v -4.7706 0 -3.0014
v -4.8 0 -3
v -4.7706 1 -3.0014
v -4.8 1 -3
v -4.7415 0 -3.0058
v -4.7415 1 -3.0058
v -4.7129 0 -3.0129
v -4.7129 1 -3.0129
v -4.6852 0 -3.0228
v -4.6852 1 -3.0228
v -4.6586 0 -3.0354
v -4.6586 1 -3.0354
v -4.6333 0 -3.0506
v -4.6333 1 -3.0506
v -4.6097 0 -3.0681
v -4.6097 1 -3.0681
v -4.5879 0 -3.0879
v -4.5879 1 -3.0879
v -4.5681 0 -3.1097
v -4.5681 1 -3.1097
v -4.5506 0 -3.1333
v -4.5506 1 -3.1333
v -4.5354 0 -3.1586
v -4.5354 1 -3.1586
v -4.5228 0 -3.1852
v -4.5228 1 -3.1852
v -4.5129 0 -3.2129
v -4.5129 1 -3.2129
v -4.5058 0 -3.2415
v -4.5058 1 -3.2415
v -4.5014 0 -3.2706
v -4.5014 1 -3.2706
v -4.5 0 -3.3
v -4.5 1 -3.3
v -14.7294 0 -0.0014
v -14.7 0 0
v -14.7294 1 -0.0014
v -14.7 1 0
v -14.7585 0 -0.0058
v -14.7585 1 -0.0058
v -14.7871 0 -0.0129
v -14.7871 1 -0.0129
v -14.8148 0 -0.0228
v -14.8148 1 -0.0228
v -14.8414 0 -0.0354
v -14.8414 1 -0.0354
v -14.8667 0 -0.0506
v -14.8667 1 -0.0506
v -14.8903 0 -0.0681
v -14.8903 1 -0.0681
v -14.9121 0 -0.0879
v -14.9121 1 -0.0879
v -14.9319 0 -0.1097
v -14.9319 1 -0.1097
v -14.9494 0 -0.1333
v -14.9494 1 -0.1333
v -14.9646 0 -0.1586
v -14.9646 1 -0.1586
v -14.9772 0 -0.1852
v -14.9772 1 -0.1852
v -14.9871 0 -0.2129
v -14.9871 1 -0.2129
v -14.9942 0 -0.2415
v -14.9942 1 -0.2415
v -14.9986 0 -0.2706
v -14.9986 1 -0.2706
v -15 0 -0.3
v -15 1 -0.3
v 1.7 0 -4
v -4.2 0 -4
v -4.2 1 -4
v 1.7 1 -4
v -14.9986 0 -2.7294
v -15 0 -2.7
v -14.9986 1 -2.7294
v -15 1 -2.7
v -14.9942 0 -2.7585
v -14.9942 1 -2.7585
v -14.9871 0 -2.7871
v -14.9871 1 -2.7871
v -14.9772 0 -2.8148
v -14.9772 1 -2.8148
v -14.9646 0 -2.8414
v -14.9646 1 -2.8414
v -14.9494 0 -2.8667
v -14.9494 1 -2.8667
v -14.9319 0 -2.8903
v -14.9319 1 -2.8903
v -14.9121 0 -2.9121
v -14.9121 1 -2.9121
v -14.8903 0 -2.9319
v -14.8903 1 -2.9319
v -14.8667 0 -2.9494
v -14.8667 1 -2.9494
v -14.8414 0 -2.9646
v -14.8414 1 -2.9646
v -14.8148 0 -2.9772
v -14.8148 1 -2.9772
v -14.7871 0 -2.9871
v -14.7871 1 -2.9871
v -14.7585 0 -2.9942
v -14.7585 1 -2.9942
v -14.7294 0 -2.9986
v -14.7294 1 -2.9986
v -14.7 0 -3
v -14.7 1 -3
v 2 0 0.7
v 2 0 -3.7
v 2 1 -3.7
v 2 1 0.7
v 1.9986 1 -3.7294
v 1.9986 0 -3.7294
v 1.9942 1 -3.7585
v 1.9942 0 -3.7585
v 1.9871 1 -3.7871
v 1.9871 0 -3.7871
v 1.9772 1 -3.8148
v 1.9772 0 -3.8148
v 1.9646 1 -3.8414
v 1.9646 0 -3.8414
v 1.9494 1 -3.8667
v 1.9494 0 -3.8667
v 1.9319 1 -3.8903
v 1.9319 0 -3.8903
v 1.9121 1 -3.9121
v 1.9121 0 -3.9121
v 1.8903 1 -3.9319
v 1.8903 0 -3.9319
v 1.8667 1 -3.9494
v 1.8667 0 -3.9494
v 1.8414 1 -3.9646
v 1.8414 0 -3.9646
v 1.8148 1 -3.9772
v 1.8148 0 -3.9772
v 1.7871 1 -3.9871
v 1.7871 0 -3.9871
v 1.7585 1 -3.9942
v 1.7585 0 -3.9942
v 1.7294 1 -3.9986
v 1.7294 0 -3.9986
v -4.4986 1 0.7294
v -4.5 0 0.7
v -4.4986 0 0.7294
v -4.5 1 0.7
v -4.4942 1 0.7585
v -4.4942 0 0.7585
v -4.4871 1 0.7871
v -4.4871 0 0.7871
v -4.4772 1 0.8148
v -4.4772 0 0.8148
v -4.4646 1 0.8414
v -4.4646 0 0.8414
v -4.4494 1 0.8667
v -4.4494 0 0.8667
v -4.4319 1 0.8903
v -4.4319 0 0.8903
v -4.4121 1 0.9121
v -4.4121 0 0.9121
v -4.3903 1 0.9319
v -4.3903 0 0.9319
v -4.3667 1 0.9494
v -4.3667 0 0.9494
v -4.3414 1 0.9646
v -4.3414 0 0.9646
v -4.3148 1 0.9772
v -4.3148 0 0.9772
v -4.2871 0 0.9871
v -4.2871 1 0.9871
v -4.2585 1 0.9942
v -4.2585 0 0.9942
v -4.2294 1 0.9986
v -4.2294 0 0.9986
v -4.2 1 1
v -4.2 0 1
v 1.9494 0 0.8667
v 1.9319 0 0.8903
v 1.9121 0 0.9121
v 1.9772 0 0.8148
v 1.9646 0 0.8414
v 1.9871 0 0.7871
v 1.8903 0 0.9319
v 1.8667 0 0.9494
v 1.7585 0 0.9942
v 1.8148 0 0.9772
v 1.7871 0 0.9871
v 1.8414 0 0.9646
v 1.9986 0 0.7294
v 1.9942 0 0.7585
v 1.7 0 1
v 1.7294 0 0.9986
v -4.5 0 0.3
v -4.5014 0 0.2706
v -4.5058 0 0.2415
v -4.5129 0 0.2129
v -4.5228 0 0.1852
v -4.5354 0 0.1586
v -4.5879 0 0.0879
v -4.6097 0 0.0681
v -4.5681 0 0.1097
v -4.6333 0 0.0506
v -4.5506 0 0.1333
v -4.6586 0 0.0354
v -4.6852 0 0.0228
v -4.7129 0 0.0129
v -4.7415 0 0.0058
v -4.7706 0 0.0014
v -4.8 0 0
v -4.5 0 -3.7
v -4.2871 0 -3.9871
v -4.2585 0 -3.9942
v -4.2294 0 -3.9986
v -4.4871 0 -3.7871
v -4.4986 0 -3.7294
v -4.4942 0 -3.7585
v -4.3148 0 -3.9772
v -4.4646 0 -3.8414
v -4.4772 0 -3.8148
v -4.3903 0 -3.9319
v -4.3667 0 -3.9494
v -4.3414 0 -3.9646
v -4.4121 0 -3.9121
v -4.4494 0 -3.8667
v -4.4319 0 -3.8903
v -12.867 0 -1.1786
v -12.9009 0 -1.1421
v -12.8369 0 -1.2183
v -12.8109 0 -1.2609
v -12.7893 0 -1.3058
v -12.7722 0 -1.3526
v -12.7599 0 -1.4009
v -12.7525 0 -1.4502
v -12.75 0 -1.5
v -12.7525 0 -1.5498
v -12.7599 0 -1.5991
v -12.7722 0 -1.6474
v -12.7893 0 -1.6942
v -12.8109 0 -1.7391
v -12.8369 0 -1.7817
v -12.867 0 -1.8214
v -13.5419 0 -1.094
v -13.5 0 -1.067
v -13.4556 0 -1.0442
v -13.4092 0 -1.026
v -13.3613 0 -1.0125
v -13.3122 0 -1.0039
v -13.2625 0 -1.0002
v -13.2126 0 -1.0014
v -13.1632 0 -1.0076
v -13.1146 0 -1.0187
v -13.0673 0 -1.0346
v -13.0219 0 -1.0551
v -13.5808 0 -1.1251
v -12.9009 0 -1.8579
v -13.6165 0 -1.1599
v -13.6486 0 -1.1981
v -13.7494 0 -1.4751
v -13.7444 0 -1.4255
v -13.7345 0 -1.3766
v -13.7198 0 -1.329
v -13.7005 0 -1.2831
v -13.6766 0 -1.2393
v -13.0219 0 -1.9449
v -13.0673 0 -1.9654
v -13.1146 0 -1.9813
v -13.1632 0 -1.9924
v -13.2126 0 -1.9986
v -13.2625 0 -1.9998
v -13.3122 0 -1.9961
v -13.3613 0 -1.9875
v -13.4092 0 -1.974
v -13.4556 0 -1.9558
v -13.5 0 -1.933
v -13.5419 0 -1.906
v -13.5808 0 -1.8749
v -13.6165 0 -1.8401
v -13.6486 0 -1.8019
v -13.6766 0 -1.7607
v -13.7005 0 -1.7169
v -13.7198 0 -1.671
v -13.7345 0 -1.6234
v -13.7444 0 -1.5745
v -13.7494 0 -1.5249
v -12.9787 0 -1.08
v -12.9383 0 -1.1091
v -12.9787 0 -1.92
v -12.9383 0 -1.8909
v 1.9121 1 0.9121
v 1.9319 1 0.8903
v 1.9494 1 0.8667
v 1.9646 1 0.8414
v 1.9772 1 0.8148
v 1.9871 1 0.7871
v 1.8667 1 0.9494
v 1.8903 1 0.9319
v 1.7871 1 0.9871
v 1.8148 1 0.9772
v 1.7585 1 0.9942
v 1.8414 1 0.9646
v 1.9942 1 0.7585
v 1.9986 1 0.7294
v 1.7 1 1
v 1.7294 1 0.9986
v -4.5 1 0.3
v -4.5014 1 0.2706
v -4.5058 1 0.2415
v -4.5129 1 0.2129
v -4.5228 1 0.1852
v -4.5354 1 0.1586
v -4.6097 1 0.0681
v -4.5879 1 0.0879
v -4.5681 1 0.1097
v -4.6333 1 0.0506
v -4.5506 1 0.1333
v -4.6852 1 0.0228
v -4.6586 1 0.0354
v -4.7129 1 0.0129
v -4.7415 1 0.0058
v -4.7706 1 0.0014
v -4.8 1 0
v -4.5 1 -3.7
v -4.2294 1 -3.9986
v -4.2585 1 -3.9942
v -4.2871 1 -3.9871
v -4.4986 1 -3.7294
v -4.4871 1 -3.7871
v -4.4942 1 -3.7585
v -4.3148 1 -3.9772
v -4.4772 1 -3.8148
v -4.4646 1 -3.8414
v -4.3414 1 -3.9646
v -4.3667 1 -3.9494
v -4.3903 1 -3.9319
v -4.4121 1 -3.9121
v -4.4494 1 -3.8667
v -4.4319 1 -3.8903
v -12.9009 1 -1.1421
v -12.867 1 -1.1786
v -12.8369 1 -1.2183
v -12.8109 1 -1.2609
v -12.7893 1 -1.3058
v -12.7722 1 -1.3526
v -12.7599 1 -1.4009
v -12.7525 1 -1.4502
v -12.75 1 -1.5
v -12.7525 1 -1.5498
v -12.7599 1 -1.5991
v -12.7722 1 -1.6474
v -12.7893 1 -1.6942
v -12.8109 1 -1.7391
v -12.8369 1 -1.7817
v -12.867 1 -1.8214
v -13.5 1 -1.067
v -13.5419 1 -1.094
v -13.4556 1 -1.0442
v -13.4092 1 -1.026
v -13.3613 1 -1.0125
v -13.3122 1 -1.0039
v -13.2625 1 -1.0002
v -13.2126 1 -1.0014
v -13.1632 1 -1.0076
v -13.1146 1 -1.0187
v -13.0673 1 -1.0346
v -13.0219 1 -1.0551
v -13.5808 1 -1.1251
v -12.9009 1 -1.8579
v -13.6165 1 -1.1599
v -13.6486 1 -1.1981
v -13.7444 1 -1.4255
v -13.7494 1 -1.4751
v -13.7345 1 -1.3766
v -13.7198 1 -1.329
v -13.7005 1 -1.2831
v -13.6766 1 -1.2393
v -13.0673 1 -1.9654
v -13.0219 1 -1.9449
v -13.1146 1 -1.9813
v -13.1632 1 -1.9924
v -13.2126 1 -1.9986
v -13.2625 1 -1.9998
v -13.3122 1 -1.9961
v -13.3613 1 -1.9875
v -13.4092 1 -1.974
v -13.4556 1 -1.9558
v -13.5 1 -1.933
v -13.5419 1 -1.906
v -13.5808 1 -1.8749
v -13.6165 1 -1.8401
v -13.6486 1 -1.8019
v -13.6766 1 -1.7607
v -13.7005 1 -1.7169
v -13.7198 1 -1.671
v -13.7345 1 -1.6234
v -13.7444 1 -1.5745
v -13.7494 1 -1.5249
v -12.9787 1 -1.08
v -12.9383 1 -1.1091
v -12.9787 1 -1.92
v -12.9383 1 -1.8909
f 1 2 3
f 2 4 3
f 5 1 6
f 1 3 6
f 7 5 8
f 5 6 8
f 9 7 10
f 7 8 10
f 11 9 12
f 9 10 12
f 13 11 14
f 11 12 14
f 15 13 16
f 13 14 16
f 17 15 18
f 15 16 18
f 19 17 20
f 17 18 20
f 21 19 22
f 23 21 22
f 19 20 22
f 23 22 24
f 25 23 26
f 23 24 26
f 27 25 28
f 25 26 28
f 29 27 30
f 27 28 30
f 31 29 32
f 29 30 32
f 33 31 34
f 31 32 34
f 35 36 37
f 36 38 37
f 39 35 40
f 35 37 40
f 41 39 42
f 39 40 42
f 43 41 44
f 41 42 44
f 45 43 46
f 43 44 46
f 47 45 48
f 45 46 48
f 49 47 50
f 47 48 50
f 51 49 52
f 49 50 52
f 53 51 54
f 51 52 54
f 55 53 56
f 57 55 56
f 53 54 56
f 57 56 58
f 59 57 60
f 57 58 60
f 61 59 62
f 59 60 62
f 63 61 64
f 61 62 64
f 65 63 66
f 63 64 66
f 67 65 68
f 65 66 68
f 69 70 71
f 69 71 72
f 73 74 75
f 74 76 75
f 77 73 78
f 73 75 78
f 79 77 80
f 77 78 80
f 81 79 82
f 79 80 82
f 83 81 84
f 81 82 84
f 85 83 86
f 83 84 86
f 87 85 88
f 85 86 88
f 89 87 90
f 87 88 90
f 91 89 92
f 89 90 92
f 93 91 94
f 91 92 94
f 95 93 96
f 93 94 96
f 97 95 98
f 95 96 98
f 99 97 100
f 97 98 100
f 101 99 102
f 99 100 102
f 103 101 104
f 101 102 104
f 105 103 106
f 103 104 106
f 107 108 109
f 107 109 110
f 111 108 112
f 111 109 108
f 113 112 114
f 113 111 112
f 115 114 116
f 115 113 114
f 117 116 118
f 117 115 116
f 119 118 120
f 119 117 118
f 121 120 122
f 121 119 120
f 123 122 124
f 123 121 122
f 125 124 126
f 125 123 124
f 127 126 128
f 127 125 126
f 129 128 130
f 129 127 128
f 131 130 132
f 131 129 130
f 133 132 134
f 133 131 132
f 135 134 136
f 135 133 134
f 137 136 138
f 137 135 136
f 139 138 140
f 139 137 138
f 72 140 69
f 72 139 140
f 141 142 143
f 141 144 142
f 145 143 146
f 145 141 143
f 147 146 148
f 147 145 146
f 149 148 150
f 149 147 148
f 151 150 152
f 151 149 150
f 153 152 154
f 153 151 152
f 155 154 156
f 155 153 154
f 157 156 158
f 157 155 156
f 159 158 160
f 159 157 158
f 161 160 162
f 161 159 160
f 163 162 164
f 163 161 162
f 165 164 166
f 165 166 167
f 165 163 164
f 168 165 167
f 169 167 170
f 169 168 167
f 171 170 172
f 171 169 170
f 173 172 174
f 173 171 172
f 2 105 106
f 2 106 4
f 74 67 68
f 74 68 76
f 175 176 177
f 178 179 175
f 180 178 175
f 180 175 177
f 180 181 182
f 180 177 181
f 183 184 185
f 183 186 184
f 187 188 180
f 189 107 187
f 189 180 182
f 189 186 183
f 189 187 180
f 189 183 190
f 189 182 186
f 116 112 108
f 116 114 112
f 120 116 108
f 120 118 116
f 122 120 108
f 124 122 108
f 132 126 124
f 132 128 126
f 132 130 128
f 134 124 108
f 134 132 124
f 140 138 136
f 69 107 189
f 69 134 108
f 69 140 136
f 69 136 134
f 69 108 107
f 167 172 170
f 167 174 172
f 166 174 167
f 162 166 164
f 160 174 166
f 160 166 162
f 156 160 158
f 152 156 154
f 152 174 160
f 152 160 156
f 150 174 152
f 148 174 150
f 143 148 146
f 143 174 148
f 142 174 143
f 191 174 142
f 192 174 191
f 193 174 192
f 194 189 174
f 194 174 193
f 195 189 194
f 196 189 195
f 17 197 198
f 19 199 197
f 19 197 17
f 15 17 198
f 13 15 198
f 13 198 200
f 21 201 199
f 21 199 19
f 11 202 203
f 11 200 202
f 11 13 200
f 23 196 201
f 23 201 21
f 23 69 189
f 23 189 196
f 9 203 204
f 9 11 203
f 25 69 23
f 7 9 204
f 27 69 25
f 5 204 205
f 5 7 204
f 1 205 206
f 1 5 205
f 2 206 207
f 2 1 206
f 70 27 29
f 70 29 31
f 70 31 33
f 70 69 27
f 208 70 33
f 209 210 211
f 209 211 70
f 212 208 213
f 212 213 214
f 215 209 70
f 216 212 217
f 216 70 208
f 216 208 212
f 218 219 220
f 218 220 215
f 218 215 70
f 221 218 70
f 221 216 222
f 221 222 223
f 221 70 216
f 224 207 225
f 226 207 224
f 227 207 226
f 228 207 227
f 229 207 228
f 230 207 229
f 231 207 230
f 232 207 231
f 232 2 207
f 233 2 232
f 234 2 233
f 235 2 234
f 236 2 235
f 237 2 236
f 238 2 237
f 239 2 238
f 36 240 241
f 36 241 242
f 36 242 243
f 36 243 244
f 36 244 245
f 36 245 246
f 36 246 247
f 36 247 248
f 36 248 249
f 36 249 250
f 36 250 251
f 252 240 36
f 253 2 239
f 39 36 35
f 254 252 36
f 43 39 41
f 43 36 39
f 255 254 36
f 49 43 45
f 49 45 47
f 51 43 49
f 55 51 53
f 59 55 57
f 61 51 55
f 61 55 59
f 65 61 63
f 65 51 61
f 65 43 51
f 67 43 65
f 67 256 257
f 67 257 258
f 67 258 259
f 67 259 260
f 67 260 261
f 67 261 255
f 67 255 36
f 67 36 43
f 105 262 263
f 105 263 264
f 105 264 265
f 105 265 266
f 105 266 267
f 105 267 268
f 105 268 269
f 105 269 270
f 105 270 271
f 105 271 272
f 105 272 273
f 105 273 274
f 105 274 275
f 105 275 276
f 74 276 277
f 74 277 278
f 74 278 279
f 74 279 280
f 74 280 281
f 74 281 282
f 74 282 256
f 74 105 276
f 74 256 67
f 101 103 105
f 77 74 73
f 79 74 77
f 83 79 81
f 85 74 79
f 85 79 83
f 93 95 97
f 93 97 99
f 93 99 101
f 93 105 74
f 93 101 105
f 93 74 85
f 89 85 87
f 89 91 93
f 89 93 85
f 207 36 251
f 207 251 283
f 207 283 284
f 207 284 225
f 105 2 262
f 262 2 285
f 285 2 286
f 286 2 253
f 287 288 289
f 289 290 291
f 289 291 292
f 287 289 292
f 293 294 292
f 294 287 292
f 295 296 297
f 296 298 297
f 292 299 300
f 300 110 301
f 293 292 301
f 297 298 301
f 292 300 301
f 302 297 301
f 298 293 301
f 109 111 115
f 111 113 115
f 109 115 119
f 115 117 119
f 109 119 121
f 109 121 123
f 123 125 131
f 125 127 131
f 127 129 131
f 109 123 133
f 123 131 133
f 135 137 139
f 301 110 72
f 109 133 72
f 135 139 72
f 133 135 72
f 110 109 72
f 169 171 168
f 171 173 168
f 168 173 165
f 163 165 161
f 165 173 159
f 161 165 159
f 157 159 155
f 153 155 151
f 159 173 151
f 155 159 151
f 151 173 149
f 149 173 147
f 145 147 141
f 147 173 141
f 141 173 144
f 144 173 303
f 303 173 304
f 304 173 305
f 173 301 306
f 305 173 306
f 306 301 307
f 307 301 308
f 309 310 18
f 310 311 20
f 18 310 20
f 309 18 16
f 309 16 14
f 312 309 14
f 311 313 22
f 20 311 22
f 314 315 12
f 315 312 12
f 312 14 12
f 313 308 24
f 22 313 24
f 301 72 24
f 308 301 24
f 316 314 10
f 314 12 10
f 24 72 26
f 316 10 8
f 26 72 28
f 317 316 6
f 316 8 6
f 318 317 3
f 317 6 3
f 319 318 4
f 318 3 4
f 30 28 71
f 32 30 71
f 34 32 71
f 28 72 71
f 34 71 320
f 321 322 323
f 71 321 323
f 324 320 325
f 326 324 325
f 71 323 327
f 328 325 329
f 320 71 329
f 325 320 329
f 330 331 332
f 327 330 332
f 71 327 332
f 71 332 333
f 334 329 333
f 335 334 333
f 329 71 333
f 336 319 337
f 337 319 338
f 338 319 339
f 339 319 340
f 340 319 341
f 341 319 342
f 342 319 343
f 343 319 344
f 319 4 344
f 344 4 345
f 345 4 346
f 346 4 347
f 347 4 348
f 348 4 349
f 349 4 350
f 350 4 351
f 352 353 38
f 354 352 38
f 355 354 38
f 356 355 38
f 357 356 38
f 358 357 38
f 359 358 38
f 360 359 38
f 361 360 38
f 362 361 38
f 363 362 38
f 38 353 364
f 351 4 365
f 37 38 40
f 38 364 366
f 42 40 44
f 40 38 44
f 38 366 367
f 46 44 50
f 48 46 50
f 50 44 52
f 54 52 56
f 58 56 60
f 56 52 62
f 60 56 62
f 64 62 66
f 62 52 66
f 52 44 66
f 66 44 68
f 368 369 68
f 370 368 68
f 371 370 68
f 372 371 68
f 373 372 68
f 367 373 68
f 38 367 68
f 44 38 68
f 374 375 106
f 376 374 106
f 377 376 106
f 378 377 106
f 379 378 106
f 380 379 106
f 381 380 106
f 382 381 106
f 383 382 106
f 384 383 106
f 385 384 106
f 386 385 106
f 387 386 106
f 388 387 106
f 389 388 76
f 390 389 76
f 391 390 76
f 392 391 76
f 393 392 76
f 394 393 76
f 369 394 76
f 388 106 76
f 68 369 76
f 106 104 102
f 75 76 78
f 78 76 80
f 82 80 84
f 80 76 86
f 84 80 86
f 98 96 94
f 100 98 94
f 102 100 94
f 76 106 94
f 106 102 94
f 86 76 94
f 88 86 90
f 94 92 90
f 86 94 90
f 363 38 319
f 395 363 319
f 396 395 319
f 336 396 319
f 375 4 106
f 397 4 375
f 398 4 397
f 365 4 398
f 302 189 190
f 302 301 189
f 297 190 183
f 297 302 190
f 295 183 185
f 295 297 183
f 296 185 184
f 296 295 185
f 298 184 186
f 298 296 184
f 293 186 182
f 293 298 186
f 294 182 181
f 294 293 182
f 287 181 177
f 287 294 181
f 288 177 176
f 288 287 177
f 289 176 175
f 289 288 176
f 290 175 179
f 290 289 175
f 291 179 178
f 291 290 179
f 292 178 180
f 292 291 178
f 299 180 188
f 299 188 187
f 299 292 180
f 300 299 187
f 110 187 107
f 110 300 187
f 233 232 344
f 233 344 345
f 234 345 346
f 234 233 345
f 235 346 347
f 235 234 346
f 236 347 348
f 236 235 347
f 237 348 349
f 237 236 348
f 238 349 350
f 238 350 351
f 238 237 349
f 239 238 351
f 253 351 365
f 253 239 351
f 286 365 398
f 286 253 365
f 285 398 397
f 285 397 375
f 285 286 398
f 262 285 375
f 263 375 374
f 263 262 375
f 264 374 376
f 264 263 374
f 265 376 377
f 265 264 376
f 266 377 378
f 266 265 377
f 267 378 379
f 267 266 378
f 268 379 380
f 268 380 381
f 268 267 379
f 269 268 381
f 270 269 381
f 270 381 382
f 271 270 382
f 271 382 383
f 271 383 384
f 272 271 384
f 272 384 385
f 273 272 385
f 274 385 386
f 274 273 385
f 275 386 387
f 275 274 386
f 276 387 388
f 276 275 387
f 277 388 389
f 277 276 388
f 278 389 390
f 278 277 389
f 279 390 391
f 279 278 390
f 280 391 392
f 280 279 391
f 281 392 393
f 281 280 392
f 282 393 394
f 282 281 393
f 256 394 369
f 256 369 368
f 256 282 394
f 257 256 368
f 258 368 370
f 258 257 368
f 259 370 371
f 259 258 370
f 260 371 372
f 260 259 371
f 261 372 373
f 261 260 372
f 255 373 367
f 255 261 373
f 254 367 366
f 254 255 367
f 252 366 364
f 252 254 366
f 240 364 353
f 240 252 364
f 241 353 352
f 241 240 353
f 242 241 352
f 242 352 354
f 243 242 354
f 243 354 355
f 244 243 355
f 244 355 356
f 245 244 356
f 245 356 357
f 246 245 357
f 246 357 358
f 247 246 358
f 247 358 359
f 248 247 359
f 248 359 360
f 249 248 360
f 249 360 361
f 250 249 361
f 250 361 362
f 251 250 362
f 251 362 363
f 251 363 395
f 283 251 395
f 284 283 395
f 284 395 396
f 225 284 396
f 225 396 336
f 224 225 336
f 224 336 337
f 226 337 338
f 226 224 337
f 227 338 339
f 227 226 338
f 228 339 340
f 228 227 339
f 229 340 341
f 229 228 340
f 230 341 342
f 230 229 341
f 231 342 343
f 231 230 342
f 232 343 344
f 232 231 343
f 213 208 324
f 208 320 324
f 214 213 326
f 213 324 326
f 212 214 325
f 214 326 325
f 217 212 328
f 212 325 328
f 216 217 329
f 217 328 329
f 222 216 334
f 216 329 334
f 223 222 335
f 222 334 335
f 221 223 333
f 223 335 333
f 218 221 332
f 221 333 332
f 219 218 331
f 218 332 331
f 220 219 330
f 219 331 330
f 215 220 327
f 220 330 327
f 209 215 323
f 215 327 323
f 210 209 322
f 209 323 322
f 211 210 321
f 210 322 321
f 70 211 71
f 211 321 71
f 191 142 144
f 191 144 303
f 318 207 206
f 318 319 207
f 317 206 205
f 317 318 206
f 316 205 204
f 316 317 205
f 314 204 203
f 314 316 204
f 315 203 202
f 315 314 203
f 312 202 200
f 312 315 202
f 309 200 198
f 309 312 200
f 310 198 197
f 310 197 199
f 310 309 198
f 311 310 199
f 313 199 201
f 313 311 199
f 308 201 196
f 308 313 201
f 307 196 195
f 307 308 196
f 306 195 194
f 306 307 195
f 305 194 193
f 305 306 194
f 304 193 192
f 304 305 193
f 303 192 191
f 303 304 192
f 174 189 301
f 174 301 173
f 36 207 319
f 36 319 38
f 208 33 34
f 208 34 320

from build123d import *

# Parameters (mm, degrees)
SKETCH1_R           = 0.5
BOSS_EXTRUDE1_DEPTH = 1
FILLET1_R           = 0.3


with BuildPart() as part:
    # Sketch1 → Boss-Extrude1 (new body)
    with BuildSketch(Plane(origin=(0, 0, 0), x_dir=(1, 0, 0), z_dir=(0, 1, 0))):
        Polygon((-4.5, 0), (-15, 0), (-15, 3), (-4.5, 3), (-4.5, 4), (2, 4), (2, -1), (-4.5, -1), align=None)
        with Locations((-13.25, 1.5)):
            Circle(SKETCH1_R, mode=Mode.SUBTRACT)
    extrude(amount=BOSS_EXTRUDE1_DEPTH)

    # Fillet1
    fillet1_edges = [part.edges().sort_by_distance(p)[0] for p in [
        (-15, 0.5, -3),
        (-4.5, 0.5, -3),
        (-4.5, 0.5, -4),
        (2, 0.5, -4),
        (2, 0.5, 1),
        (-4.5, 0.5, 1),
        (-4.5, 0.5, 0),
        (-15, 0.5, 0),
    ]]
    fillet(fillet1_edges, radius=FILLET1_R)


solid = part.part
